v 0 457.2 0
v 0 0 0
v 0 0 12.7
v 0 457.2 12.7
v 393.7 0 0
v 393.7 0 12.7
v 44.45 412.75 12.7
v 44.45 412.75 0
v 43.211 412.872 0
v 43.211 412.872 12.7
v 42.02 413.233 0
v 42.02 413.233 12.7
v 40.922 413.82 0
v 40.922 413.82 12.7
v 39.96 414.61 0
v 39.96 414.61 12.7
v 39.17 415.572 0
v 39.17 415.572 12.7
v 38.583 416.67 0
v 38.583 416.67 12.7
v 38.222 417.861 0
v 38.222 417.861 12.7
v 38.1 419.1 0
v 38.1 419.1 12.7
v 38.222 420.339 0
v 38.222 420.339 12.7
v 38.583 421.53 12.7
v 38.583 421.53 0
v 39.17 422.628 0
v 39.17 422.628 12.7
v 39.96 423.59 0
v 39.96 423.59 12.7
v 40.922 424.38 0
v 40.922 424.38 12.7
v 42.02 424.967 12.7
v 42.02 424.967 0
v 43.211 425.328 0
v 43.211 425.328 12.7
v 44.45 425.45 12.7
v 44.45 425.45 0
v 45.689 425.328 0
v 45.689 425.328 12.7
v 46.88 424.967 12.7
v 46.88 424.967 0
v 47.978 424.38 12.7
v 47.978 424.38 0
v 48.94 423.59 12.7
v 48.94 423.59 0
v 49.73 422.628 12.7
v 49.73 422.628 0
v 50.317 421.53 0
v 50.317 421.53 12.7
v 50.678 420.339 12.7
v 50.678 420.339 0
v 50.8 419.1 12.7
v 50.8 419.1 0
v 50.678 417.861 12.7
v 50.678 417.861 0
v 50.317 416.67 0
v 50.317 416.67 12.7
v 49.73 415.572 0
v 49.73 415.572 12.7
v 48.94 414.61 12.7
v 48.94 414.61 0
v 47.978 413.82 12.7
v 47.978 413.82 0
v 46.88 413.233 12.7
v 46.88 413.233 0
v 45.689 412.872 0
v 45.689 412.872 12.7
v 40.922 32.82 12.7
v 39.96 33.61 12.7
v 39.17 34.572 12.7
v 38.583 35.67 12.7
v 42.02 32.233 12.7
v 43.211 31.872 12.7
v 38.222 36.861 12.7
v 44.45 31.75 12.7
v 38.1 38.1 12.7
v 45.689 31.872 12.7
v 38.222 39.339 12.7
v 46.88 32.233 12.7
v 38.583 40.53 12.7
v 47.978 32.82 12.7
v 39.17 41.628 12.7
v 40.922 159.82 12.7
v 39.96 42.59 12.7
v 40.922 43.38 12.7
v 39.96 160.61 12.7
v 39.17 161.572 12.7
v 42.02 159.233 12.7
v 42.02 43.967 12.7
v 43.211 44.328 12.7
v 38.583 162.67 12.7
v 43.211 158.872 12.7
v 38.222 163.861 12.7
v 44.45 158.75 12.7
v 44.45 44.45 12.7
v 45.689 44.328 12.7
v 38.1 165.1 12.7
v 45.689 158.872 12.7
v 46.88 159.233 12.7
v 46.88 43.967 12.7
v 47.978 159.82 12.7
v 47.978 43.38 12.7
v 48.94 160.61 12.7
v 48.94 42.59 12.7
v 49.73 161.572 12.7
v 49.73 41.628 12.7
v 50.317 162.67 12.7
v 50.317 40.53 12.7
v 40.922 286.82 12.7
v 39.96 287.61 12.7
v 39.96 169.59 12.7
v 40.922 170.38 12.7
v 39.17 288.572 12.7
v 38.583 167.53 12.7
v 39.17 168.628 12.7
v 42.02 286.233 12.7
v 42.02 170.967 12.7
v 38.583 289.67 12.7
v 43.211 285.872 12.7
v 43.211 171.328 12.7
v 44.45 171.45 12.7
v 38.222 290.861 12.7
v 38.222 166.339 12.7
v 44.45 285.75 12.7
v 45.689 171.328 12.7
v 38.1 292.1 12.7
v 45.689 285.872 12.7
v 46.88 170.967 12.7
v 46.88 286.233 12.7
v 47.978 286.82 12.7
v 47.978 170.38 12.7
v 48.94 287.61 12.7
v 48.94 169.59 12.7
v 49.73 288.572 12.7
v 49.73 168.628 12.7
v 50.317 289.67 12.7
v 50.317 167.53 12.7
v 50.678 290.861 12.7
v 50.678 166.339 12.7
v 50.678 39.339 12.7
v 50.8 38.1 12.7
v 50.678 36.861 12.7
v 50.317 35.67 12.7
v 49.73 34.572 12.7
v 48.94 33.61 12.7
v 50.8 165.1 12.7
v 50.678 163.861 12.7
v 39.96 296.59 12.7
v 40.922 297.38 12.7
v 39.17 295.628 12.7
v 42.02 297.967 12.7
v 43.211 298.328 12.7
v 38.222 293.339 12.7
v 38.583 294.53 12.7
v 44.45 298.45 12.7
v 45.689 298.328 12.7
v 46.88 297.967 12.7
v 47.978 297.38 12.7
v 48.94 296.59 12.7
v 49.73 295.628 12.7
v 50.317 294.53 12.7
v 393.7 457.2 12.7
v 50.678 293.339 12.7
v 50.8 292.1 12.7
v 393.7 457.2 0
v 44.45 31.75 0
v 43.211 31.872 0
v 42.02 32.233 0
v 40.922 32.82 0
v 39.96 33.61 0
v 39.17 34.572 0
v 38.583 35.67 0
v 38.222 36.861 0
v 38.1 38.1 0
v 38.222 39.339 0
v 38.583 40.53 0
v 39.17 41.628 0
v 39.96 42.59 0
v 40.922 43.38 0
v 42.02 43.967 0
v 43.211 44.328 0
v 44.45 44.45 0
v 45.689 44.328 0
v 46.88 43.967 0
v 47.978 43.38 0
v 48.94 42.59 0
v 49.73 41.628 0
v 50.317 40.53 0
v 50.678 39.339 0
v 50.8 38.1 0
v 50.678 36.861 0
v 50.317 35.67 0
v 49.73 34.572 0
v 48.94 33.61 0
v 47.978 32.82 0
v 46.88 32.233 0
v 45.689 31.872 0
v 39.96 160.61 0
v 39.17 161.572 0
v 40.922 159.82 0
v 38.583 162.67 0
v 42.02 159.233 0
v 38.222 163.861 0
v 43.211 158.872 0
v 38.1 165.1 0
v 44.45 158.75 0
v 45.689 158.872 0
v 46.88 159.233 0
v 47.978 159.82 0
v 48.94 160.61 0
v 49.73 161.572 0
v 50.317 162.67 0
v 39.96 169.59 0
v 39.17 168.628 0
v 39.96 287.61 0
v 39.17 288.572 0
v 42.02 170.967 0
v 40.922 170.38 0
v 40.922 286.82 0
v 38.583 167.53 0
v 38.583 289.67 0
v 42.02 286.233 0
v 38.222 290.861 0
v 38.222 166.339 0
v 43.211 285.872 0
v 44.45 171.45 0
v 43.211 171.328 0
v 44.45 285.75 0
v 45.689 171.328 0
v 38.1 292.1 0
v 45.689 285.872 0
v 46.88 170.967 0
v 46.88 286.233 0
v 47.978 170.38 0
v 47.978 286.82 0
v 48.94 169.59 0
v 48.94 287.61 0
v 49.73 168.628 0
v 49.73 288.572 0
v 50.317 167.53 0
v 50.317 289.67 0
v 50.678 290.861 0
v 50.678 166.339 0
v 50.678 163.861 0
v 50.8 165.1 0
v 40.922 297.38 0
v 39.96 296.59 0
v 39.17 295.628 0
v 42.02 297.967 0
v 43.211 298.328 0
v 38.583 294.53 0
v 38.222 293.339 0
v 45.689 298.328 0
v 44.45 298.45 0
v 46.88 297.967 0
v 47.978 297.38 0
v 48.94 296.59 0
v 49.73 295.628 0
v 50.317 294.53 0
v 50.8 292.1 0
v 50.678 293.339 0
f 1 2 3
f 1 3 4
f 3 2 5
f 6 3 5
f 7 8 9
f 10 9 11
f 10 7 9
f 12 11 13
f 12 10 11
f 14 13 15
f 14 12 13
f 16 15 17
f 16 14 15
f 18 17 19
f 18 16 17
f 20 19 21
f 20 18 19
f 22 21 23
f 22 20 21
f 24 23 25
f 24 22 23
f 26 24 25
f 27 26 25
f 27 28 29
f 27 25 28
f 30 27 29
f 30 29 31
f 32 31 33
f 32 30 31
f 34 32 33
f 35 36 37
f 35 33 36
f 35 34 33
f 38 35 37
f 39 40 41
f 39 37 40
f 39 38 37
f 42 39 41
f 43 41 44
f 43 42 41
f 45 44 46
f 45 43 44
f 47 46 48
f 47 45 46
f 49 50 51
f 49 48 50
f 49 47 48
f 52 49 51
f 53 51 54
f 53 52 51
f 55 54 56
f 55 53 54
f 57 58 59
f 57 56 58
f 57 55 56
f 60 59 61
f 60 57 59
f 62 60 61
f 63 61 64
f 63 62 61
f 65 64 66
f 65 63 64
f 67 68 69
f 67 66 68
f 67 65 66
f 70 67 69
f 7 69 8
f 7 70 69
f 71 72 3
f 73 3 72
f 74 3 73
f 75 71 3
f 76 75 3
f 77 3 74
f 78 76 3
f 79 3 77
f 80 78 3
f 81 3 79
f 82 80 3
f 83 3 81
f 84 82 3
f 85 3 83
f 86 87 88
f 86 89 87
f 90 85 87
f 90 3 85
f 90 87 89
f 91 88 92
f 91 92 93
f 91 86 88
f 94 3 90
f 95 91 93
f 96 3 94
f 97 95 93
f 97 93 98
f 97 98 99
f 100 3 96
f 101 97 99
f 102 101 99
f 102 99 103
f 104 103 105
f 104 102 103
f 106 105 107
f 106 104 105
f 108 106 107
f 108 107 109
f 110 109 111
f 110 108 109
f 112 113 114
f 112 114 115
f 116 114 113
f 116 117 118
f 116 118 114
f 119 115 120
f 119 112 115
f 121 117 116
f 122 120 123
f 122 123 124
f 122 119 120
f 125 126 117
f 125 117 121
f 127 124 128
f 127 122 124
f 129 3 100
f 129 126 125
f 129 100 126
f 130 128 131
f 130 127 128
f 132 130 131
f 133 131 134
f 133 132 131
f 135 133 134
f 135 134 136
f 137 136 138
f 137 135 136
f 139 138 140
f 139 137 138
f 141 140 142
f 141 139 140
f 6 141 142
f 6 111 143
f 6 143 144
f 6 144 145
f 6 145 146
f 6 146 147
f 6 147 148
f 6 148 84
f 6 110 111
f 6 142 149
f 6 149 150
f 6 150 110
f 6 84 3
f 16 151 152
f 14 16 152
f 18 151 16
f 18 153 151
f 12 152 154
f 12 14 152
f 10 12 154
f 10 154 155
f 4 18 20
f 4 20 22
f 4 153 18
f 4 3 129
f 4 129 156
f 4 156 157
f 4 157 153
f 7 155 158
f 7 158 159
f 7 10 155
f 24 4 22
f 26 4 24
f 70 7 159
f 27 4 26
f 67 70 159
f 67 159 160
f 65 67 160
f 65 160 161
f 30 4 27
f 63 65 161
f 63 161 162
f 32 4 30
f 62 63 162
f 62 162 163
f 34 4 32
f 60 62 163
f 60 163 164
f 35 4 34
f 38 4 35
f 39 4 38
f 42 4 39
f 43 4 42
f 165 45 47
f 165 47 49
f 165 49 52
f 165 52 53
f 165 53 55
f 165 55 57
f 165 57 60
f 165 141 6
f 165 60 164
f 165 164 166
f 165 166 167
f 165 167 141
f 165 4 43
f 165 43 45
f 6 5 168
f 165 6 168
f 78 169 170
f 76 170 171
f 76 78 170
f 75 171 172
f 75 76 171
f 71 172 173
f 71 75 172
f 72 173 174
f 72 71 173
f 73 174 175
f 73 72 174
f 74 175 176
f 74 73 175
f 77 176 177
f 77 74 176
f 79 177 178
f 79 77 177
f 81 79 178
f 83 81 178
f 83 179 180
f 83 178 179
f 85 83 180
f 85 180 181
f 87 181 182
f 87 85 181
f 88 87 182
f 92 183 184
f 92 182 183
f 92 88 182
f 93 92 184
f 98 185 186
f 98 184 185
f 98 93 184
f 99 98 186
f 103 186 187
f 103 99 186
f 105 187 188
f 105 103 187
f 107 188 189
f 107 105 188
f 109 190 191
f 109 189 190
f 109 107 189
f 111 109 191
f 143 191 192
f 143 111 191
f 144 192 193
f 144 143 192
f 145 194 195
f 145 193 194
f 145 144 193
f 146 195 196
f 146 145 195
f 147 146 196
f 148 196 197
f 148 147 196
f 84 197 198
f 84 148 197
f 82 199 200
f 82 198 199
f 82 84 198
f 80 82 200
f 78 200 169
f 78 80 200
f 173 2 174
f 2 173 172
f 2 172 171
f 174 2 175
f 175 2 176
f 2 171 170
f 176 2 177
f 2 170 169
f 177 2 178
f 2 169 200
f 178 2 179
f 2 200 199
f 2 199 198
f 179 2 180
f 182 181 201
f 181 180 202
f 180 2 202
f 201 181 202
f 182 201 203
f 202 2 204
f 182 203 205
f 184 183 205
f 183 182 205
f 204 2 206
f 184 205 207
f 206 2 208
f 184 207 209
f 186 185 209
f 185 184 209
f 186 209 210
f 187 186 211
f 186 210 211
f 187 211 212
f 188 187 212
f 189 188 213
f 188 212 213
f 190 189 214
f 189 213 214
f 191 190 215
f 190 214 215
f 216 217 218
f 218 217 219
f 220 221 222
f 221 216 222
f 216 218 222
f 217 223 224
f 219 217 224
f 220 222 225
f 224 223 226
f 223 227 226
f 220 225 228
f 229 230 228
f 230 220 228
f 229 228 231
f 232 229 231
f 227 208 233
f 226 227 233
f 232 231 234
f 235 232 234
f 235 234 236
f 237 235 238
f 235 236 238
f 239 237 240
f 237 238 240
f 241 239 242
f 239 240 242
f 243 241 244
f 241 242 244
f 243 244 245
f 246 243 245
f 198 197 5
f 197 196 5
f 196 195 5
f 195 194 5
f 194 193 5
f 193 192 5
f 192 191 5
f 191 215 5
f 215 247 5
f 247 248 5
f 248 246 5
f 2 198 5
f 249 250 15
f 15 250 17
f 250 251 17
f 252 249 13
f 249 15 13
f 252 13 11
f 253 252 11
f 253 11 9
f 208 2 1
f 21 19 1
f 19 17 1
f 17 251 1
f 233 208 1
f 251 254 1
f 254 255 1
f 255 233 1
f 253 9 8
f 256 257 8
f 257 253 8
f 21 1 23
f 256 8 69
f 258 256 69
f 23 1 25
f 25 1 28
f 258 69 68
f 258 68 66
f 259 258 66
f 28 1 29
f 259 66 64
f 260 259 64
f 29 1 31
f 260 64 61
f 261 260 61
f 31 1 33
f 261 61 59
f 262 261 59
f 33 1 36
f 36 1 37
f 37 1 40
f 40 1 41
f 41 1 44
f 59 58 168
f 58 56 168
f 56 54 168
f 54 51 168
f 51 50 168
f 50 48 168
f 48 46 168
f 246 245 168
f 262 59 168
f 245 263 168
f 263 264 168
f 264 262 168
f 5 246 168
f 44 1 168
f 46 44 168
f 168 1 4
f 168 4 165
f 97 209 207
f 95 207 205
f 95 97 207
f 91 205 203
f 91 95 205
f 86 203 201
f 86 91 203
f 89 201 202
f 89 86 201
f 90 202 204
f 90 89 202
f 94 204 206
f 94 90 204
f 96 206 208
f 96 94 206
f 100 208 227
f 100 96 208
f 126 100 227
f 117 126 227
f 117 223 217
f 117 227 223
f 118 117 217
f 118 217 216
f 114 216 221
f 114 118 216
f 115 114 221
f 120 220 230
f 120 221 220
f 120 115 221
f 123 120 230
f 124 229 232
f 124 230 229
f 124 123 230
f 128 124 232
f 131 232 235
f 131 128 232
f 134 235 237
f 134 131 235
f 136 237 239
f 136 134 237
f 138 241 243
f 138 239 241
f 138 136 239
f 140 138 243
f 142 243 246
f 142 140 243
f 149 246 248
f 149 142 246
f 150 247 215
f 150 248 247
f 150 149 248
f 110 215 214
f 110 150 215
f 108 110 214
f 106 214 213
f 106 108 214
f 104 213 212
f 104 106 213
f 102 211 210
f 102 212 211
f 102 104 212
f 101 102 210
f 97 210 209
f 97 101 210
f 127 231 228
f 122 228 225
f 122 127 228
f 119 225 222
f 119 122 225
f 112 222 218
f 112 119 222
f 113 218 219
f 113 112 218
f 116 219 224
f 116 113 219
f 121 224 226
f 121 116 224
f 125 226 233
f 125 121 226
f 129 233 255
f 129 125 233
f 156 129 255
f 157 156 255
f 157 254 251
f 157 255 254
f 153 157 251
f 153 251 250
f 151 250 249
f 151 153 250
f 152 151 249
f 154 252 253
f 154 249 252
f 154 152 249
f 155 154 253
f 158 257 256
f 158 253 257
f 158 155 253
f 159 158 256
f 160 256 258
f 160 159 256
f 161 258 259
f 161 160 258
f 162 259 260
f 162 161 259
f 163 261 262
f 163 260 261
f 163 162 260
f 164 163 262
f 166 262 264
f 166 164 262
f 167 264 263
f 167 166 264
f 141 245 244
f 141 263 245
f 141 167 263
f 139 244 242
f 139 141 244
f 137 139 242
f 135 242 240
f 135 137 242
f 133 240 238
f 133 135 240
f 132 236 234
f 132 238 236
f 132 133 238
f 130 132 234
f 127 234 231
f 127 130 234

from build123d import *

# Parameters (mm, degrees)
SKETCH1_W                 = 393.7
SKETCH1_H                 = 457.2
PLATE_DEPTH               = 12.7
PATTERN_LINEAR_1110_COUNT = 4
PATTERN_LINEAR_1110_PITCH = 127


with BuildPart() as part:
    # Sketch1 → Plate (new body)
    with BuildSketch(Plane.XY):
        with Locations((196.85, 228.6)):
            Rectangle(SKETCH1_W, SKETCH1_H)
    extrude(amount=PLATE_DEPTH)

    # Sketch3 → Hole (revolve, cut)
    with BuildSketch(Plane(origin=(44.45, 38.1, 12.7), x_dir=(0, -1, 0), z_dir=(1, 0, 0))):
        Polygon((0, 0), (0, 29.215464931), (6.35, 25.4), (6.35, 0), align=None)
    hole = revolve(axis=Axis((44.45, 38.1, 19.05), (0, 0, -1)), mode=Mode.SUBTRACT)

    # Pattern Linear 1110: Hole ×4
    with Locations(*[(0, i * PATTERN_LINEAR_1110_PITCH, 0) for i in range(1, PATTERN_LINEAR_1110_COUNT)]):
        add(hole, mode=Mode.SUBTRACT)


solid = part.part
